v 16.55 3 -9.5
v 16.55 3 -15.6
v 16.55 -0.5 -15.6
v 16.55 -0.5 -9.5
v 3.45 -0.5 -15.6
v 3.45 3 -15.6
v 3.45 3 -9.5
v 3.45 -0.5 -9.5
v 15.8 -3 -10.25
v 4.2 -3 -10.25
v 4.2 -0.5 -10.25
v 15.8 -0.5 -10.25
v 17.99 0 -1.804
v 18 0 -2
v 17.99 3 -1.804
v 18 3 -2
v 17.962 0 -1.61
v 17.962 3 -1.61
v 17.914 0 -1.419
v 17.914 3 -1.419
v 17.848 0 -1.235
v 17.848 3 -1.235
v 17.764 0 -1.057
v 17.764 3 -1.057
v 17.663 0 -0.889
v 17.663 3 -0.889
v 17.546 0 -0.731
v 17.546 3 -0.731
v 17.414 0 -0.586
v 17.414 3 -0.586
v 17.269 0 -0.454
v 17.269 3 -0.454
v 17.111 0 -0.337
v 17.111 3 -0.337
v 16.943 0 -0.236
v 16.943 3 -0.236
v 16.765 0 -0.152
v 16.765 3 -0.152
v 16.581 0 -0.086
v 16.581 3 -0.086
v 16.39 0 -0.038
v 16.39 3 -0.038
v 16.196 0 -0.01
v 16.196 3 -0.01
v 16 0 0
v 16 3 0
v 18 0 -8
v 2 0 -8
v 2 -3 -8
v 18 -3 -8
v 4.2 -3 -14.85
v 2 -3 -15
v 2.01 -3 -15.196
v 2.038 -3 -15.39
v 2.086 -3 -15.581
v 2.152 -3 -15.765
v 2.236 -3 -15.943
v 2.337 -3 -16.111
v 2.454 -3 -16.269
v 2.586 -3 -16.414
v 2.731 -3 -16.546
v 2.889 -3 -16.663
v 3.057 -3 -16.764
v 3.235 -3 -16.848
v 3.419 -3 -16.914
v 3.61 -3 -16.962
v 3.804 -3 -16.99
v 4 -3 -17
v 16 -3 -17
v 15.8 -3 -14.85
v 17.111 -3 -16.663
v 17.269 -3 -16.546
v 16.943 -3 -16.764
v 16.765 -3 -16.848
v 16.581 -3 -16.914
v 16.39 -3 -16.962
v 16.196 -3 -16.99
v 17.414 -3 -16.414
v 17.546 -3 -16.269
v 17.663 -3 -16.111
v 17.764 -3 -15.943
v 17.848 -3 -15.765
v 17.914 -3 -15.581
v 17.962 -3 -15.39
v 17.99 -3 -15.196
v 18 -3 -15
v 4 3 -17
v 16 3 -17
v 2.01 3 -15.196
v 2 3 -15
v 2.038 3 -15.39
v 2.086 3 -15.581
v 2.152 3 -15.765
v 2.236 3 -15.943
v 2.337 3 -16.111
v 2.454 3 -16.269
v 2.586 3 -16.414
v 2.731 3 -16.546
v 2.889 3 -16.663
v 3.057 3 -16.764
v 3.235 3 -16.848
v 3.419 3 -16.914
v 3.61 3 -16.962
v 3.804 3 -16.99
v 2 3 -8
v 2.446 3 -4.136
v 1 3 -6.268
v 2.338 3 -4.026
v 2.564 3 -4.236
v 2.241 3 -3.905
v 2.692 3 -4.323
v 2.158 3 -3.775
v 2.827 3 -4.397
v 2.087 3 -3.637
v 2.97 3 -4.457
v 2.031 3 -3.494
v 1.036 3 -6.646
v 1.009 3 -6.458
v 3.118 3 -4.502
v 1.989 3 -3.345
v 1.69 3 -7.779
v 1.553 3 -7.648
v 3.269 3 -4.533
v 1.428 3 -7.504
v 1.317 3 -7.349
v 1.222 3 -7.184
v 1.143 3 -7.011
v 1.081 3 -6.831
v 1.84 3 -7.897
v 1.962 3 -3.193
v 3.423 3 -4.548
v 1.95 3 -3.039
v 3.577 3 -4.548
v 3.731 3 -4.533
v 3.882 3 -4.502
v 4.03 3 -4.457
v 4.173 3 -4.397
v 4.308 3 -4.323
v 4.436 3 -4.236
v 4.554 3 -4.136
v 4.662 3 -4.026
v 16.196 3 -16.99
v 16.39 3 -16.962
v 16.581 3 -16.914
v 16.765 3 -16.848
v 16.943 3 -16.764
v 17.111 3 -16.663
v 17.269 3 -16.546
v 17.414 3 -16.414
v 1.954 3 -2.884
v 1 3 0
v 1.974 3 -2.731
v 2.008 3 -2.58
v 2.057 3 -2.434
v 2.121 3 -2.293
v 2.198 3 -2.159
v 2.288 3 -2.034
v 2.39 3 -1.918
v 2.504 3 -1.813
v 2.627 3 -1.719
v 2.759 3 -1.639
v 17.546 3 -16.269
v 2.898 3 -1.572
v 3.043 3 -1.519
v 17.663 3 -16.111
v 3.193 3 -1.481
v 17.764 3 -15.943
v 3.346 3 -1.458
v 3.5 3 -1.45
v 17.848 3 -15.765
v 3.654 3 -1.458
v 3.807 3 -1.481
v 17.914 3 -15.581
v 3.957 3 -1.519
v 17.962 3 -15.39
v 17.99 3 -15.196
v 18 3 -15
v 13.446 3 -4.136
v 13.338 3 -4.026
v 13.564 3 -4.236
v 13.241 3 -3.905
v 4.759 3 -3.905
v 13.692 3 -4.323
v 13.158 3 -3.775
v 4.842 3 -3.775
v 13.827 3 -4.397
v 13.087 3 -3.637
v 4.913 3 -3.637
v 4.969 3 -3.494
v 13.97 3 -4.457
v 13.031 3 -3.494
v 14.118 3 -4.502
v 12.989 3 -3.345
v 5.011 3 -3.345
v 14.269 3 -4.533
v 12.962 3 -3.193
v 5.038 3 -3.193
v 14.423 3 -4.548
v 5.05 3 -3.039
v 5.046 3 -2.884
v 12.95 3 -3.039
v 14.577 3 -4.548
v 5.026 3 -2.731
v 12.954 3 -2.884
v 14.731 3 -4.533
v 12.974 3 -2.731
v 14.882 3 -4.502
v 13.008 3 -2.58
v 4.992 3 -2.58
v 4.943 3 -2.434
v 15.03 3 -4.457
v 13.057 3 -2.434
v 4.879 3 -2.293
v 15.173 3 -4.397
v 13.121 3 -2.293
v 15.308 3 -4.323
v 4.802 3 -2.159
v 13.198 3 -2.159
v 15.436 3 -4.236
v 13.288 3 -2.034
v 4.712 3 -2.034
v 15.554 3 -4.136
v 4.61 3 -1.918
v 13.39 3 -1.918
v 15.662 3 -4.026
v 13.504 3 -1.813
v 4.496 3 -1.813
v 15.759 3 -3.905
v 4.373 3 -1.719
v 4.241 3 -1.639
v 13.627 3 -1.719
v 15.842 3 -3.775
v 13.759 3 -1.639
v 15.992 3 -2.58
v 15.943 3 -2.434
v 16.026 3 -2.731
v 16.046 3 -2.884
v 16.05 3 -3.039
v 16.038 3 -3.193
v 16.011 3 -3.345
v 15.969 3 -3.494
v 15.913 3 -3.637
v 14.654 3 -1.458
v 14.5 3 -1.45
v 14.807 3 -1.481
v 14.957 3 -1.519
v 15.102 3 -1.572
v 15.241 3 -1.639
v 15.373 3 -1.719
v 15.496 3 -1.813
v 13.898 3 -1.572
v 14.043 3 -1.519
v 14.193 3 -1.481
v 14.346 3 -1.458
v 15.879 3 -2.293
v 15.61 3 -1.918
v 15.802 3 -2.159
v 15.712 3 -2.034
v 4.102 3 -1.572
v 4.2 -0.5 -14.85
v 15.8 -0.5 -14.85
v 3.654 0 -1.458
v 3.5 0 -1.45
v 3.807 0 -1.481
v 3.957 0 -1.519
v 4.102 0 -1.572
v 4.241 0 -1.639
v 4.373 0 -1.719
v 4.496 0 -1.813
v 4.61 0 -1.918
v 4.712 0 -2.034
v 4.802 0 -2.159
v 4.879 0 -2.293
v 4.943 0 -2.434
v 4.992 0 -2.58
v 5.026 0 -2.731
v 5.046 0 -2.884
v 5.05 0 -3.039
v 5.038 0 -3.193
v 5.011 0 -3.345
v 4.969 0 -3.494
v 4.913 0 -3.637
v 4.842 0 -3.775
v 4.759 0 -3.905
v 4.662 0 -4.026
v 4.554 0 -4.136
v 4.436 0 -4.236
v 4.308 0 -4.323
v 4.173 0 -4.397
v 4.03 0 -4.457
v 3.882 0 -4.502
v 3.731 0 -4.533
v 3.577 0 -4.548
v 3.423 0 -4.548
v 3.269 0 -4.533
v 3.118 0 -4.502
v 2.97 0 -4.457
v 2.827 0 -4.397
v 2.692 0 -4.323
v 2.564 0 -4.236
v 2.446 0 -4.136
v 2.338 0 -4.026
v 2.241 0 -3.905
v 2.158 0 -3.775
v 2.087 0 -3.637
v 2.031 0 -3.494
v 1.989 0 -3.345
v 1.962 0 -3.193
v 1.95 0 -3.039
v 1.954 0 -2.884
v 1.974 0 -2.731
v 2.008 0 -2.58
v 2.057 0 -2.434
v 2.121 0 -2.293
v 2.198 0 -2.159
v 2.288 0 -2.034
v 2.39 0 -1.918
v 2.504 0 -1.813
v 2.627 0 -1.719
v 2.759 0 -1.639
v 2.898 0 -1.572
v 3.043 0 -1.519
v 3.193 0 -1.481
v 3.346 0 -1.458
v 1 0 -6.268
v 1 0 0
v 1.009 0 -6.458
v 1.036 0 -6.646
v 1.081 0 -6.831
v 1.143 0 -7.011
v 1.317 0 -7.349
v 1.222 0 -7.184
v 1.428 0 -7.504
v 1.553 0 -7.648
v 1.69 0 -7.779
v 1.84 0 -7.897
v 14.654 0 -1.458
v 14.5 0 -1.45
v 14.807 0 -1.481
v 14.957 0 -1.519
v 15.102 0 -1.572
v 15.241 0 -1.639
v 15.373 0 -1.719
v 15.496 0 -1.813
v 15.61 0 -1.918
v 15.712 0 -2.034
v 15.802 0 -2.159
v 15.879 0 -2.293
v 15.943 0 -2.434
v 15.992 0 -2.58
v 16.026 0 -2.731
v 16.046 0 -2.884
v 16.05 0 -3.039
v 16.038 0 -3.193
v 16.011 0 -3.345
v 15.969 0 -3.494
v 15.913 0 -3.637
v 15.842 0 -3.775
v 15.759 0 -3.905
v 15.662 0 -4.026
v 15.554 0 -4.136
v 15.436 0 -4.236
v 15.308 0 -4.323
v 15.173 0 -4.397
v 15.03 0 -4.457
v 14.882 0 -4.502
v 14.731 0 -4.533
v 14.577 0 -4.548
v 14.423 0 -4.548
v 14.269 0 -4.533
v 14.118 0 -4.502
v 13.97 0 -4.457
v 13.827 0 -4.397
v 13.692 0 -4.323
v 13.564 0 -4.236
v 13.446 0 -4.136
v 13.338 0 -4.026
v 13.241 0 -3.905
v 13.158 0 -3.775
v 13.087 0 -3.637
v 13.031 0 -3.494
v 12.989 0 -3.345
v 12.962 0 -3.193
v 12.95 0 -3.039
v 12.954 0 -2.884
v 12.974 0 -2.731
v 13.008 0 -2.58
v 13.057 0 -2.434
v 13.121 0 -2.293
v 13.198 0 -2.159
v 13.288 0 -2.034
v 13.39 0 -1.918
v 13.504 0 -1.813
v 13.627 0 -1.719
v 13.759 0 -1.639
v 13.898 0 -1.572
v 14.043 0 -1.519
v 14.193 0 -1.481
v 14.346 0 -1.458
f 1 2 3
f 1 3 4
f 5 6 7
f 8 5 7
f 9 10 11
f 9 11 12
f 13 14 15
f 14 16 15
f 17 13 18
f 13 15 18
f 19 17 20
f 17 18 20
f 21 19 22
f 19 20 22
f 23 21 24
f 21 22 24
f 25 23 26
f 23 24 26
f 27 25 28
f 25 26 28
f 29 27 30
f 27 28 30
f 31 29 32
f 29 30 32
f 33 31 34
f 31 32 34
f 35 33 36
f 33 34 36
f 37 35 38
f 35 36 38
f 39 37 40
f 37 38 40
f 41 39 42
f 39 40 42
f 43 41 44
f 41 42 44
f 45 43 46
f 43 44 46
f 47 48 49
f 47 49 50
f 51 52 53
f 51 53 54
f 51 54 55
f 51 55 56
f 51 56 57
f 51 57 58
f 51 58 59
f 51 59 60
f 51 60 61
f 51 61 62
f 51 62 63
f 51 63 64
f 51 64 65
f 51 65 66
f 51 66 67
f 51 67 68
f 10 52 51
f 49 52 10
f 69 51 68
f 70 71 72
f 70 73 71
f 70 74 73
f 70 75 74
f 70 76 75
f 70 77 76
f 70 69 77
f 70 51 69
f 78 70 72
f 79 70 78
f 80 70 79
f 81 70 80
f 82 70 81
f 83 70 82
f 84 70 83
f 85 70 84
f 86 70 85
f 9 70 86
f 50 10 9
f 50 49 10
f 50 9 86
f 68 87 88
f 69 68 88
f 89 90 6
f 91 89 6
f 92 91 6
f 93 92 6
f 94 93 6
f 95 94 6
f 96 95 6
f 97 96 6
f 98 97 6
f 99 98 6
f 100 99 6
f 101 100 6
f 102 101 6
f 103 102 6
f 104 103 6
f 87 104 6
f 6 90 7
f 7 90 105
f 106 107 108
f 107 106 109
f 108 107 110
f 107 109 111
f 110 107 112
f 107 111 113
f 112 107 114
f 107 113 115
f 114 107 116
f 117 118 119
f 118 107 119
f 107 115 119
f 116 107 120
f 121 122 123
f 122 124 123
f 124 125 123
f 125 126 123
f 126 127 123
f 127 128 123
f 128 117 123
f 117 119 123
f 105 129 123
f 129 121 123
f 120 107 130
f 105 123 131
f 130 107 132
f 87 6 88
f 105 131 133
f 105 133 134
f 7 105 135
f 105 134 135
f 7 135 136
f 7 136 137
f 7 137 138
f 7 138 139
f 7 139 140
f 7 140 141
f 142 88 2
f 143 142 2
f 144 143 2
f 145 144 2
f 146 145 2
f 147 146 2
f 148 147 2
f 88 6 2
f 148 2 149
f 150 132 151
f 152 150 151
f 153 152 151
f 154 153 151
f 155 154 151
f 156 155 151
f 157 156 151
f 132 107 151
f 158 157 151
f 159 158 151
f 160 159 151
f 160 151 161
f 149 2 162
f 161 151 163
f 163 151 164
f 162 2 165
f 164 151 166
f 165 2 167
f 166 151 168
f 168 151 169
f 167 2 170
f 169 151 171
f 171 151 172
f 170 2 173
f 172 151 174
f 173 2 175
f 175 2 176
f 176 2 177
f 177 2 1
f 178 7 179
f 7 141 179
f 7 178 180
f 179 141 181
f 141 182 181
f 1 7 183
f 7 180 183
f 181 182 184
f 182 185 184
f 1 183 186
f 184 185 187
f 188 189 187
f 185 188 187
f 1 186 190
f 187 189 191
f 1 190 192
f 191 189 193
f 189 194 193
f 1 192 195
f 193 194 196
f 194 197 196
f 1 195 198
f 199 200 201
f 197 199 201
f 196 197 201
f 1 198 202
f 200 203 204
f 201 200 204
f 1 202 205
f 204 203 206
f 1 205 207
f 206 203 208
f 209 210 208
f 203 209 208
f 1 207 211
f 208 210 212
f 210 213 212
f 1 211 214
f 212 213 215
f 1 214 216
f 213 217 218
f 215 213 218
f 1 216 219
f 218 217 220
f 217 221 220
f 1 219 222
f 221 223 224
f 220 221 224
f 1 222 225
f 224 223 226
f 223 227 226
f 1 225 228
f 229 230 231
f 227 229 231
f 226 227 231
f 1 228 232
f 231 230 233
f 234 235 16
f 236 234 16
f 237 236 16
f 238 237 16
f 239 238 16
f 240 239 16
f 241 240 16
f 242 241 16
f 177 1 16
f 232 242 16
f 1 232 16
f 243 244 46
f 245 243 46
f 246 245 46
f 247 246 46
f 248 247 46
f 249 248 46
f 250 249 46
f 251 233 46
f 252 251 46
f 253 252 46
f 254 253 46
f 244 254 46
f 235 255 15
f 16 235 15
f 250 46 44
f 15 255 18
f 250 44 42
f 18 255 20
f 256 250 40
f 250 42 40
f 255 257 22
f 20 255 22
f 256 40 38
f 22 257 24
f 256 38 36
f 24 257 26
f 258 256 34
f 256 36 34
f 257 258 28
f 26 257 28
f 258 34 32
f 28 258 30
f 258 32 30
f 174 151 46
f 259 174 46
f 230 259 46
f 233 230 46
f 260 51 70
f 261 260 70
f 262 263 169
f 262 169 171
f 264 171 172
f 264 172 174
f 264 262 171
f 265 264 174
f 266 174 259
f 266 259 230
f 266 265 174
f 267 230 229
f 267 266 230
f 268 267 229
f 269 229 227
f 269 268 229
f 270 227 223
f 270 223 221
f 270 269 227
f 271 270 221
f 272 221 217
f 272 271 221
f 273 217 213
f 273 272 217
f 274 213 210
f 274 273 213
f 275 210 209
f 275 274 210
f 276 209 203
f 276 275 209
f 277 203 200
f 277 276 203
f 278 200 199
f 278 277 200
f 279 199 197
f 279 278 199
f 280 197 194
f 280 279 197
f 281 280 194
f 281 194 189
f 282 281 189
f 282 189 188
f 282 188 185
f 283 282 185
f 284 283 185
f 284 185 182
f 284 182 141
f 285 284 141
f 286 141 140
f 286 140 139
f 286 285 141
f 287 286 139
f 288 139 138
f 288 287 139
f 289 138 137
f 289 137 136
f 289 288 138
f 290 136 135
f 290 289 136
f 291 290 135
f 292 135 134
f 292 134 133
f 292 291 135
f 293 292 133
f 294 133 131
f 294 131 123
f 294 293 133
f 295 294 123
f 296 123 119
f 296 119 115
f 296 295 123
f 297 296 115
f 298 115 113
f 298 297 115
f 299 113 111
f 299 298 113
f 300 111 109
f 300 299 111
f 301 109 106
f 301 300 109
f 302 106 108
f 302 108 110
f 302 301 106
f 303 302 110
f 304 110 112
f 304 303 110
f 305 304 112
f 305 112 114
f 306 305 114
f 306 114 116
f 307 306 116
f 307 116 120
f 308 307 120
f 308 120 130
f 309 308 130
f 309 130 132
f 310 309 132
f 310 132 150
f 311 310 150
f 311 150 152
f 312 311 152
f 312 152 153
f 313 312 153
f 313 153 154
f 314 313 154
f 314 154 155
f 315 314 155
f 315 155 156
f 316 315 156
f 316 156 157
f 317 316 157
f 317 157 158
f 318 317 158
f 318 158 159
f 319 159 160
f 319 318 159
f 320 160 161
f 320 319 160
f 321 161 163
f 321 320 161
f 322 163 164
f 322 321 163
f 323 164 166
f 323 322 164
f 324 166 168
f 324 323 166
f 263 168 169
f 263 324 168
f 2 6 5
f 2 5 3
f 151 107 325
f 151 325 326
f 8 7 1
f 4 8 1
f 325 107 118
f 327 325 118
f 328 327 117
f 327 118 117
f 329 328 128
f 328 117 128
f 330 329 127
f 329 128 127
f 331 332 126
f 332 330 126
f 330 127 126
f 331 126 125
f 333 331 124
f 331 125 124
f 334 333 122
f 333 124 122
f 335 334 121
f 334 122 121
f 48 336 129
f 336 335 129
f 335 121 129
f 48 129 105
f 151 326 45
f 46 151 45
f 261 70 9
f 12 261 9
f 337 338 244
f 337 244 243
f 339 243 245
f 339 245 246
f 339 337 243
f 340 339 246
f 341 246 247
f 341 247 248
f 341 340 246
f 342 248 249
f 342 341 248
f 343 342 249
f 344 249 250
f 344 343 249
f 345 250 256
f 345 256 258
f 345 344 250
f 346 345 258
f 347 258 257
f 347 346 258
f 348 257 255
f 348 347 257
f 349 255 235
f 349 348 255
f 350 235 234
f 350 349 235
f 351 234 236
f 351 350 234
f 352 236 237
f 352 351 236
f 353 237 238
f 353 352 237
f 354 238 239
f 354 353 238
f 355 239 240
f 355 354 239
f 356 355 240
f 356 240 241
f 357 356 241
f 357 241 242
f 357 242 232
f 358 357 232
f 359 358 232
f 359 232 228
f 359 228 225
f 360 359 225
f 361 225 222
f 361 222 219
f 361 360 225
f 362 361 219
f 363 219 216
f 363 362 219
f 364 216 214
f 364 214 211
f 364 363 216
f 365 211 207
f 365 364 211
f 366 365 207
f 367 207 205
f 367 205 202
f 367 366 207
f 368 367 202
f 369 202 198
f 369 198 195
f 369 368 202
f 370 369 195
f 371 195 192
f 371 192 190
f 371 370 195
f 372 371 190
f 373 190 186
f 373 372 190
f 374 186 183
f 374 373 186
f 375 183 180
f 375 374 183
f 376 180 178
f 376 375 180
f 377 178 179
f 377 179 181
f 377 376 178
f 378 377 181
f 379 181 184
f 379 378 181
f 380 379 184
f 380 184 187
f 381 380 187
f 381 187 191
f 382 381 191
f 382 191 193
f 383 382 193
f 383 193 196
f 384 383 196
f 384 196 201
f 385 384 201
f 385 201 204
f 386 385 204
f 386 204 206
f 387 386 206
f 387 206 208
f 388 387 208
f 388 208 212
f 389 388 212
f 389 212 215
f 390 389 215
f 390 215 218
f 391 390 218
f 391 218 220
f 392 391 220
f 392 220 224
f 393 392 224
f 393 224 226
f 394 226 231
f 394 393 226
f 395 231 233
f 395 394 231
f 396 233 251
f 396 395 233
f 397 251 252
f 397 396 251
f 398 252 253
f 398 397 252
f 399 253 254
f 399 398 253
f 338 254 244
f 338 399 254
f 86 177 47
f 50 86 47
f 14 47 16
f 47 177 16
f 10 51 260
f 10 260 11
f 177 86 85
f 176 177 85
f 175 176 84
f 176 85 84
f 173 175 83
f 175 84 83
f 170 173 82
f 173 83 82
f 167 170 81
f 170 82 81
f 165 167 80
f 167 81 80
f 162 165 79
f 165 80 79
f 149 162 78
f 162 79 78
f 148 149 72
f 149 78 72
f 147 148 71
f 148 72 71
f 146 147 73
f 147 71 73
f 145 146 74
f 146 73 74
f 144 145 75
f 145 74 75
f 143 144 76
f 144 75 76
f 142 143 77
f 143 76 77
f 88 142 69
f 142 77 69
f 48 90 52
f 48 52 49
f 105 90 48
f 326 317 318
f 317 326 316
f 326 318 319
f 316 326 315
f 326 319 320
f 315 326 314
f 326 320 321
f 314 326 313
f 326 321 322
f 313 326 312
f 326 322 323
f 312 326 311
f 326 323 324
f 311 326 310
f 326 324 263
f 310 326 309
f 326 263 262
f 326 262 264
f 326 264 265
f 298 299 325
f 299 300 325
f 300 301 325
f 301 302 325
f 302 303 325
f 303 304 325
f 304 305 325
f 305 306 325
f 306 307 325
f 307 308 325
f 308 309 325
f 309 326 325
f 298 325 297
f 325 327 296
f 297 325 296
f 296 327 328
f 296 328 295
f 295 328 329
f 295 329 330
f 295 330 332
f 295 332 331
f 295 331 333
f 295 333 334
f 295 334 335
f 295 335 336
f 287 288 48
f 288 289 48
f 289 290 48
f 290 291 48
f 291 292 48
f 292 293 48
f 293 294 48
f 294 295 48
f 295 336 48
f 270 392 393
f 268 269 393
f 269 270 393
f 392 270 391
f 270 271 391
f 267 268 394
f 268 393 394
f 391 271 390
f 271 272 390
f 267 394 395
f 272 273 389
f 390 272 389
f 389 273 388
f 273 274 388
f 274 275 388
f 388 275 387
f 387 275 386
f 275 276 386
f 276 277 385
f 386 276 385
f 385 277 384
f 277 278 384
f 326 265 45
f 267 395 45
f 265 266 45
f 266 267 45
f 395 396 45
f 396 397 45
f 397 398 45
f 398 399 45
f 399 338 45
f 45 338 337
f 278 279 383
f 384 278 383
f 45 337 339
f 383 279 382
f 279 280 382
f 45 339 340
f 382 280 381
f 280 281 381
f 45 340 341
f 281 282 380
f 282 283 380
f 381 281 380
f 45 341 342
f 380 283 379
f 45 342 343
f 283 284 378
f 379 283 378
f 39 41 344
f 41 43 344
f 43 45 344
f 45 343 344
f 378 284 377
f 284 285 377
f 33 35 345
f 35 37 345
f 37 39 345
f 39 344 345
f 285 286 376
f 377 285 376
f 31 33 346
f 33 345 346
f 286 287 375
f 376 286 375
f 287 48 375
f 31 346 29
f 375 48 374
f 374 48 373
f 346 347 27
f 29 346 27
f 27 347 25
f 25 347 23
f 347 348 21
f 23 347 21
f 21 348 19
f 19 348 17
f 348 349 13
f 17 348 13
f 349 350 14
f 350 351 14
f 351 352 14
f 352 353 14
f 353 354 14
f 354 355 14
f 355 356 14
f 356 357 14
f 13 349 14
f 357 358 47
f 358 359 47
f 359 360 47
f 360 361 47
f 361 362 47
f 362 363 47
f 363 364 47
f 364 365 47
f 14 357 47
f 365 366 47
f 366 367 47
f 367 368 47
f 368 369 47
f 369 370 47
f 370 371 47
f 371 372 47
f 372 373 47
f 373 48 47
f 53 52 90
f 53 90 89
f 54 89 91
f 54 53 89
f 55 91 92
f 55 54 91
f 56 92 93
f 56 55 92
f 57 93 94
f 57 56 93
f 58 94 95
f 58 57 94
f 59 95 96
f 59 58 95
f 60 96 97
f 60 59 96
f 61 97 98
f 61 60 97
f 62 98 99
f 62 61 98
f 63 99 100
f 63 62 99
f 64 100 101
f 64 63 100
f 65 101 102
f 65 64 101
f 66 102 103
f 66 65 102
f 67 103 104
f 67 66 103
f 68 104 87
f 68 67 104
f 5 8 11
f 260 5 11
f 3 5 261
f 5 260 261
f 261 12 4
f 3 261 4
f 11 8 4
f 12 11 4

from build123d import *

# Parameters (mm, degrees)
CROQUIS1_W              = 18
CROQUIS1_H              = 18
CROQUIS1_R              = 1.55
SALIENTE_EXTRUIR1_DEPTH = 3
CROQUIS3_W              = 18
CROQUIS3_H              = 10
SALIENTE_EXTRUIR3_DEPTH = 3
CORTAR_EXTRUIR1_REACH   = 28.153
CROQUIS4_W              = 2
CROQUIS4_H              = 10
CROQUIS7_W              = 13.1
CROQUIS7_H              = 6.1
CORTAR_EXTRUIR2_DEPTH   = 6
CROQUIS9_W              = 16
CROQUIS9_H              = 10
CROQUIS9_W_2            = 13.1
CROQUIS9_H_2            = 6.1
SALIENTE_EXTRUIR4_DEPTH = 3
CROQUIS10_W             = 13.1
CROQUIS10_H             = 6.1
CROQUIS10_W_2           = 11.6
CROQUIS10_H_2           = 4.6
SALIENTE_EXTRUIR6_DEPTH = 2.5
CROQUIS11_W             = 16
CROQUIS11_H             = 1
CORTAR_EXTRUIR4_DEPTH   = 9
REDONDEO1_R             = 2
CROQUIS12_W             = 8
CROQUIS12_H             = 3
CORTAR_EXTRUIR5_DEPTH   = 1
CROQUIS14_W             = 16
CROQUIS14_H             = 3
CORTAR_EXTRUIR6_DEPTH   = 9
REDONDEO2_R             = 2


with BuildPart() as part:
    # Croquis1 → Saliente-Extruir1 (new body)
    with BuildSketch(Plane(origin=(0, 0, 0), x_dir=(1, 0, 0), z_dir=(0, 1, 0))):
        with Locations((9, 9)):
            Rectangle(CROQUIS1_W, CROQUIS1_H)
        with Locations(Location((3.5, 3, 0), (0, 0, 270))):
            Circle(CROQUIS1_R, mode=Mode.SUBTRACT)
        with Locations(Location((14.5, 3, 0), (0, 0, 270))):
            Circle(CROQUIS1_R, mode=Mode.SUBTRACT)
    extrude(amount=SALIENTE_EXTRUIR1_DEPTH)

    # Croquis3 → Saliente-Extruir3 (add)
    with BuildSketch(Plane(origin=(0, 3, 0), x_dir=(1, 0, 0), z_dir=(0, 1, 0))):
        with Locations((9, 13)):
            Rectangle(CROQUIS3_W, CROQUIS3_H)
    extrude(amount=SALIENTE_EXTRUIR3_DEPTH)

    # Cortar-Extruir1: up to this face of the body (flat: up to its plane)
    cortar_extruir1_end = Plane(part.part.faces().sort_by_distance((9, 6, -13))[0])
    # Croquis4 → Cortar-Extruir1 (cut, up to the picked face)
    with BuildSketch(Plane.XZ, mode=Mode.PRIVATE) as cortar_extruir1_sk1:
        with Locations((1, -13)):
            Rectangle(CROQUIS4_W, CROQUIS4_H)
    cortar_extruir1_tool1 = split(extrude(cortar_extruir1_sk1.sketch, amount=-CORTAR_EXTRUIR1_REACH, mode=Mode.PRIVATE), bisect_by=cortar_extruir1_end, keep=Keep.BOTH, mode=Mode.PRIVATE)
    add(cortar_extruir1_tool1.solids().sort_by(Axis((1, 0, -13), (0, 1, 0)))[0], mode=Mode.SUBTRACT)

    # Croquis7 → Cortar-Extruir2 (cut)
    with BuildSketch(Plane(origin=(0, 6, 0), x_dir=(1, 0, 0), z_dir=(0, 1, 0))):
        with Locations((10, 12.55)):
            Rectangle(CROQUIS7_W, CROQUIS7_H)
    extrude(amount=-CORTAR_EXTRUIR2_DEPTH, mode=Mode.SUBTRACT)

    # Croquis9 → Saliente-Extruir4 (add)
    with BuildSketch(Plane.XZ):
        with Locations((10, -13)):
            Rectangle(CROQUIS9_W, CROQUIS9_H)
        with Locations((10, -12.55)):
            Rectangle(CROQUIS9_W_2, CROQUIS9_H_2, mode=Mode.SUBTRACT)
    extrude(amount=SALIENTE_EXTRUIR4_DEPTH)

    # Croquis10 → Saliente-Extruir6 (add)
    with BuildSketch(Plane.XZ.offset(3)):
        with Locations((10, -12.55)):
            Rectangle(CROQUIS10_W, CROQUIS10_H)
        with Locations((10, -12.55)):
            Rectangle(CROQUIS10_W_2, CROQUIS10_H_2, mode=Mode.SUBTRACT)
    extrude(amount=-SALIENTE_EXTRUIR6_DEPTH)

    # Croquis11 → Cortar-Extruir4 (cut)
    with BuildSketch(Plane(origin=(0, 6, 0), x_dir=(1, 0, 0), z_dir=(0, 1, 0))):
        with Locations((10, 17.5)):
            Rectangle(CROQUIS11_W, CROQUIS11_H)
    extrude(amount=-CORTAR_EXTRUIR4_DEPTH, mode=Mode.SUBTRACT)

    # Redondeo1
    redondeo1_edges = [part.edges().sort_by_distance(p)[0] for p in [
        (18, 1.5, -17),
        (2, 1.5, -17),
        (18, 1.5, 0),
    ]]
    fillet(redondeo1_edges, radius=REDONDEO1_R)

    # Croquis12 → Cortar-Extruir5 (cut)
    with BuildSketch(Plane.ZY):
        with Locations((-4, 1.5)):
            Rectangle(CROQUIS12_W, CROQUIS12_H)
    extrude(amount=-CORTAR_EXTRUIR5_DEPTH, mode=Mode.SUBTRACT)

    # Croquis14 → Cortar-Extruir6 (cut)
    with BuildSketch(Plane.XY.offset(-8)):
        with Locations((10, 4.5)):
            Rectangle(CROQUIS14_W, CROQUIS14_H)
    extrude(amount=-CORTAR_EXTRUIR6_DEPTH, mode=Mode.SUBTRACT)

    # Redondeo2
    # the kernel refuses this fillet: 2 mm, written as the material it takes off along each edge
    with BuildSketch(Plane(origin=(1, 7.330127019, -8), x_dir=(0, 0, 1), z_dir=(0, -1, 0))) as redondeo2_piece_1:
        with BuildLine():
            CenterArc((1.732050808, -2), REDONDEO2_R, 90, 60)
            Line((0, -1), (-0.034641016, -0.98))
            ThreePointArc((-0.034641016, -0.98), (-0.04, -0.5), (-0.04, 0))
            Line((-0.04, 0), (0, 0.04))
            Line((0, 0.04), (1.732050808, 0.04))
            Line((1.732050808, 0.04), (1.732050808, 0))
        make_face()
    extrude(amount=11.660254038, mode=Mode.SUBTRACT)


solid = part.part
